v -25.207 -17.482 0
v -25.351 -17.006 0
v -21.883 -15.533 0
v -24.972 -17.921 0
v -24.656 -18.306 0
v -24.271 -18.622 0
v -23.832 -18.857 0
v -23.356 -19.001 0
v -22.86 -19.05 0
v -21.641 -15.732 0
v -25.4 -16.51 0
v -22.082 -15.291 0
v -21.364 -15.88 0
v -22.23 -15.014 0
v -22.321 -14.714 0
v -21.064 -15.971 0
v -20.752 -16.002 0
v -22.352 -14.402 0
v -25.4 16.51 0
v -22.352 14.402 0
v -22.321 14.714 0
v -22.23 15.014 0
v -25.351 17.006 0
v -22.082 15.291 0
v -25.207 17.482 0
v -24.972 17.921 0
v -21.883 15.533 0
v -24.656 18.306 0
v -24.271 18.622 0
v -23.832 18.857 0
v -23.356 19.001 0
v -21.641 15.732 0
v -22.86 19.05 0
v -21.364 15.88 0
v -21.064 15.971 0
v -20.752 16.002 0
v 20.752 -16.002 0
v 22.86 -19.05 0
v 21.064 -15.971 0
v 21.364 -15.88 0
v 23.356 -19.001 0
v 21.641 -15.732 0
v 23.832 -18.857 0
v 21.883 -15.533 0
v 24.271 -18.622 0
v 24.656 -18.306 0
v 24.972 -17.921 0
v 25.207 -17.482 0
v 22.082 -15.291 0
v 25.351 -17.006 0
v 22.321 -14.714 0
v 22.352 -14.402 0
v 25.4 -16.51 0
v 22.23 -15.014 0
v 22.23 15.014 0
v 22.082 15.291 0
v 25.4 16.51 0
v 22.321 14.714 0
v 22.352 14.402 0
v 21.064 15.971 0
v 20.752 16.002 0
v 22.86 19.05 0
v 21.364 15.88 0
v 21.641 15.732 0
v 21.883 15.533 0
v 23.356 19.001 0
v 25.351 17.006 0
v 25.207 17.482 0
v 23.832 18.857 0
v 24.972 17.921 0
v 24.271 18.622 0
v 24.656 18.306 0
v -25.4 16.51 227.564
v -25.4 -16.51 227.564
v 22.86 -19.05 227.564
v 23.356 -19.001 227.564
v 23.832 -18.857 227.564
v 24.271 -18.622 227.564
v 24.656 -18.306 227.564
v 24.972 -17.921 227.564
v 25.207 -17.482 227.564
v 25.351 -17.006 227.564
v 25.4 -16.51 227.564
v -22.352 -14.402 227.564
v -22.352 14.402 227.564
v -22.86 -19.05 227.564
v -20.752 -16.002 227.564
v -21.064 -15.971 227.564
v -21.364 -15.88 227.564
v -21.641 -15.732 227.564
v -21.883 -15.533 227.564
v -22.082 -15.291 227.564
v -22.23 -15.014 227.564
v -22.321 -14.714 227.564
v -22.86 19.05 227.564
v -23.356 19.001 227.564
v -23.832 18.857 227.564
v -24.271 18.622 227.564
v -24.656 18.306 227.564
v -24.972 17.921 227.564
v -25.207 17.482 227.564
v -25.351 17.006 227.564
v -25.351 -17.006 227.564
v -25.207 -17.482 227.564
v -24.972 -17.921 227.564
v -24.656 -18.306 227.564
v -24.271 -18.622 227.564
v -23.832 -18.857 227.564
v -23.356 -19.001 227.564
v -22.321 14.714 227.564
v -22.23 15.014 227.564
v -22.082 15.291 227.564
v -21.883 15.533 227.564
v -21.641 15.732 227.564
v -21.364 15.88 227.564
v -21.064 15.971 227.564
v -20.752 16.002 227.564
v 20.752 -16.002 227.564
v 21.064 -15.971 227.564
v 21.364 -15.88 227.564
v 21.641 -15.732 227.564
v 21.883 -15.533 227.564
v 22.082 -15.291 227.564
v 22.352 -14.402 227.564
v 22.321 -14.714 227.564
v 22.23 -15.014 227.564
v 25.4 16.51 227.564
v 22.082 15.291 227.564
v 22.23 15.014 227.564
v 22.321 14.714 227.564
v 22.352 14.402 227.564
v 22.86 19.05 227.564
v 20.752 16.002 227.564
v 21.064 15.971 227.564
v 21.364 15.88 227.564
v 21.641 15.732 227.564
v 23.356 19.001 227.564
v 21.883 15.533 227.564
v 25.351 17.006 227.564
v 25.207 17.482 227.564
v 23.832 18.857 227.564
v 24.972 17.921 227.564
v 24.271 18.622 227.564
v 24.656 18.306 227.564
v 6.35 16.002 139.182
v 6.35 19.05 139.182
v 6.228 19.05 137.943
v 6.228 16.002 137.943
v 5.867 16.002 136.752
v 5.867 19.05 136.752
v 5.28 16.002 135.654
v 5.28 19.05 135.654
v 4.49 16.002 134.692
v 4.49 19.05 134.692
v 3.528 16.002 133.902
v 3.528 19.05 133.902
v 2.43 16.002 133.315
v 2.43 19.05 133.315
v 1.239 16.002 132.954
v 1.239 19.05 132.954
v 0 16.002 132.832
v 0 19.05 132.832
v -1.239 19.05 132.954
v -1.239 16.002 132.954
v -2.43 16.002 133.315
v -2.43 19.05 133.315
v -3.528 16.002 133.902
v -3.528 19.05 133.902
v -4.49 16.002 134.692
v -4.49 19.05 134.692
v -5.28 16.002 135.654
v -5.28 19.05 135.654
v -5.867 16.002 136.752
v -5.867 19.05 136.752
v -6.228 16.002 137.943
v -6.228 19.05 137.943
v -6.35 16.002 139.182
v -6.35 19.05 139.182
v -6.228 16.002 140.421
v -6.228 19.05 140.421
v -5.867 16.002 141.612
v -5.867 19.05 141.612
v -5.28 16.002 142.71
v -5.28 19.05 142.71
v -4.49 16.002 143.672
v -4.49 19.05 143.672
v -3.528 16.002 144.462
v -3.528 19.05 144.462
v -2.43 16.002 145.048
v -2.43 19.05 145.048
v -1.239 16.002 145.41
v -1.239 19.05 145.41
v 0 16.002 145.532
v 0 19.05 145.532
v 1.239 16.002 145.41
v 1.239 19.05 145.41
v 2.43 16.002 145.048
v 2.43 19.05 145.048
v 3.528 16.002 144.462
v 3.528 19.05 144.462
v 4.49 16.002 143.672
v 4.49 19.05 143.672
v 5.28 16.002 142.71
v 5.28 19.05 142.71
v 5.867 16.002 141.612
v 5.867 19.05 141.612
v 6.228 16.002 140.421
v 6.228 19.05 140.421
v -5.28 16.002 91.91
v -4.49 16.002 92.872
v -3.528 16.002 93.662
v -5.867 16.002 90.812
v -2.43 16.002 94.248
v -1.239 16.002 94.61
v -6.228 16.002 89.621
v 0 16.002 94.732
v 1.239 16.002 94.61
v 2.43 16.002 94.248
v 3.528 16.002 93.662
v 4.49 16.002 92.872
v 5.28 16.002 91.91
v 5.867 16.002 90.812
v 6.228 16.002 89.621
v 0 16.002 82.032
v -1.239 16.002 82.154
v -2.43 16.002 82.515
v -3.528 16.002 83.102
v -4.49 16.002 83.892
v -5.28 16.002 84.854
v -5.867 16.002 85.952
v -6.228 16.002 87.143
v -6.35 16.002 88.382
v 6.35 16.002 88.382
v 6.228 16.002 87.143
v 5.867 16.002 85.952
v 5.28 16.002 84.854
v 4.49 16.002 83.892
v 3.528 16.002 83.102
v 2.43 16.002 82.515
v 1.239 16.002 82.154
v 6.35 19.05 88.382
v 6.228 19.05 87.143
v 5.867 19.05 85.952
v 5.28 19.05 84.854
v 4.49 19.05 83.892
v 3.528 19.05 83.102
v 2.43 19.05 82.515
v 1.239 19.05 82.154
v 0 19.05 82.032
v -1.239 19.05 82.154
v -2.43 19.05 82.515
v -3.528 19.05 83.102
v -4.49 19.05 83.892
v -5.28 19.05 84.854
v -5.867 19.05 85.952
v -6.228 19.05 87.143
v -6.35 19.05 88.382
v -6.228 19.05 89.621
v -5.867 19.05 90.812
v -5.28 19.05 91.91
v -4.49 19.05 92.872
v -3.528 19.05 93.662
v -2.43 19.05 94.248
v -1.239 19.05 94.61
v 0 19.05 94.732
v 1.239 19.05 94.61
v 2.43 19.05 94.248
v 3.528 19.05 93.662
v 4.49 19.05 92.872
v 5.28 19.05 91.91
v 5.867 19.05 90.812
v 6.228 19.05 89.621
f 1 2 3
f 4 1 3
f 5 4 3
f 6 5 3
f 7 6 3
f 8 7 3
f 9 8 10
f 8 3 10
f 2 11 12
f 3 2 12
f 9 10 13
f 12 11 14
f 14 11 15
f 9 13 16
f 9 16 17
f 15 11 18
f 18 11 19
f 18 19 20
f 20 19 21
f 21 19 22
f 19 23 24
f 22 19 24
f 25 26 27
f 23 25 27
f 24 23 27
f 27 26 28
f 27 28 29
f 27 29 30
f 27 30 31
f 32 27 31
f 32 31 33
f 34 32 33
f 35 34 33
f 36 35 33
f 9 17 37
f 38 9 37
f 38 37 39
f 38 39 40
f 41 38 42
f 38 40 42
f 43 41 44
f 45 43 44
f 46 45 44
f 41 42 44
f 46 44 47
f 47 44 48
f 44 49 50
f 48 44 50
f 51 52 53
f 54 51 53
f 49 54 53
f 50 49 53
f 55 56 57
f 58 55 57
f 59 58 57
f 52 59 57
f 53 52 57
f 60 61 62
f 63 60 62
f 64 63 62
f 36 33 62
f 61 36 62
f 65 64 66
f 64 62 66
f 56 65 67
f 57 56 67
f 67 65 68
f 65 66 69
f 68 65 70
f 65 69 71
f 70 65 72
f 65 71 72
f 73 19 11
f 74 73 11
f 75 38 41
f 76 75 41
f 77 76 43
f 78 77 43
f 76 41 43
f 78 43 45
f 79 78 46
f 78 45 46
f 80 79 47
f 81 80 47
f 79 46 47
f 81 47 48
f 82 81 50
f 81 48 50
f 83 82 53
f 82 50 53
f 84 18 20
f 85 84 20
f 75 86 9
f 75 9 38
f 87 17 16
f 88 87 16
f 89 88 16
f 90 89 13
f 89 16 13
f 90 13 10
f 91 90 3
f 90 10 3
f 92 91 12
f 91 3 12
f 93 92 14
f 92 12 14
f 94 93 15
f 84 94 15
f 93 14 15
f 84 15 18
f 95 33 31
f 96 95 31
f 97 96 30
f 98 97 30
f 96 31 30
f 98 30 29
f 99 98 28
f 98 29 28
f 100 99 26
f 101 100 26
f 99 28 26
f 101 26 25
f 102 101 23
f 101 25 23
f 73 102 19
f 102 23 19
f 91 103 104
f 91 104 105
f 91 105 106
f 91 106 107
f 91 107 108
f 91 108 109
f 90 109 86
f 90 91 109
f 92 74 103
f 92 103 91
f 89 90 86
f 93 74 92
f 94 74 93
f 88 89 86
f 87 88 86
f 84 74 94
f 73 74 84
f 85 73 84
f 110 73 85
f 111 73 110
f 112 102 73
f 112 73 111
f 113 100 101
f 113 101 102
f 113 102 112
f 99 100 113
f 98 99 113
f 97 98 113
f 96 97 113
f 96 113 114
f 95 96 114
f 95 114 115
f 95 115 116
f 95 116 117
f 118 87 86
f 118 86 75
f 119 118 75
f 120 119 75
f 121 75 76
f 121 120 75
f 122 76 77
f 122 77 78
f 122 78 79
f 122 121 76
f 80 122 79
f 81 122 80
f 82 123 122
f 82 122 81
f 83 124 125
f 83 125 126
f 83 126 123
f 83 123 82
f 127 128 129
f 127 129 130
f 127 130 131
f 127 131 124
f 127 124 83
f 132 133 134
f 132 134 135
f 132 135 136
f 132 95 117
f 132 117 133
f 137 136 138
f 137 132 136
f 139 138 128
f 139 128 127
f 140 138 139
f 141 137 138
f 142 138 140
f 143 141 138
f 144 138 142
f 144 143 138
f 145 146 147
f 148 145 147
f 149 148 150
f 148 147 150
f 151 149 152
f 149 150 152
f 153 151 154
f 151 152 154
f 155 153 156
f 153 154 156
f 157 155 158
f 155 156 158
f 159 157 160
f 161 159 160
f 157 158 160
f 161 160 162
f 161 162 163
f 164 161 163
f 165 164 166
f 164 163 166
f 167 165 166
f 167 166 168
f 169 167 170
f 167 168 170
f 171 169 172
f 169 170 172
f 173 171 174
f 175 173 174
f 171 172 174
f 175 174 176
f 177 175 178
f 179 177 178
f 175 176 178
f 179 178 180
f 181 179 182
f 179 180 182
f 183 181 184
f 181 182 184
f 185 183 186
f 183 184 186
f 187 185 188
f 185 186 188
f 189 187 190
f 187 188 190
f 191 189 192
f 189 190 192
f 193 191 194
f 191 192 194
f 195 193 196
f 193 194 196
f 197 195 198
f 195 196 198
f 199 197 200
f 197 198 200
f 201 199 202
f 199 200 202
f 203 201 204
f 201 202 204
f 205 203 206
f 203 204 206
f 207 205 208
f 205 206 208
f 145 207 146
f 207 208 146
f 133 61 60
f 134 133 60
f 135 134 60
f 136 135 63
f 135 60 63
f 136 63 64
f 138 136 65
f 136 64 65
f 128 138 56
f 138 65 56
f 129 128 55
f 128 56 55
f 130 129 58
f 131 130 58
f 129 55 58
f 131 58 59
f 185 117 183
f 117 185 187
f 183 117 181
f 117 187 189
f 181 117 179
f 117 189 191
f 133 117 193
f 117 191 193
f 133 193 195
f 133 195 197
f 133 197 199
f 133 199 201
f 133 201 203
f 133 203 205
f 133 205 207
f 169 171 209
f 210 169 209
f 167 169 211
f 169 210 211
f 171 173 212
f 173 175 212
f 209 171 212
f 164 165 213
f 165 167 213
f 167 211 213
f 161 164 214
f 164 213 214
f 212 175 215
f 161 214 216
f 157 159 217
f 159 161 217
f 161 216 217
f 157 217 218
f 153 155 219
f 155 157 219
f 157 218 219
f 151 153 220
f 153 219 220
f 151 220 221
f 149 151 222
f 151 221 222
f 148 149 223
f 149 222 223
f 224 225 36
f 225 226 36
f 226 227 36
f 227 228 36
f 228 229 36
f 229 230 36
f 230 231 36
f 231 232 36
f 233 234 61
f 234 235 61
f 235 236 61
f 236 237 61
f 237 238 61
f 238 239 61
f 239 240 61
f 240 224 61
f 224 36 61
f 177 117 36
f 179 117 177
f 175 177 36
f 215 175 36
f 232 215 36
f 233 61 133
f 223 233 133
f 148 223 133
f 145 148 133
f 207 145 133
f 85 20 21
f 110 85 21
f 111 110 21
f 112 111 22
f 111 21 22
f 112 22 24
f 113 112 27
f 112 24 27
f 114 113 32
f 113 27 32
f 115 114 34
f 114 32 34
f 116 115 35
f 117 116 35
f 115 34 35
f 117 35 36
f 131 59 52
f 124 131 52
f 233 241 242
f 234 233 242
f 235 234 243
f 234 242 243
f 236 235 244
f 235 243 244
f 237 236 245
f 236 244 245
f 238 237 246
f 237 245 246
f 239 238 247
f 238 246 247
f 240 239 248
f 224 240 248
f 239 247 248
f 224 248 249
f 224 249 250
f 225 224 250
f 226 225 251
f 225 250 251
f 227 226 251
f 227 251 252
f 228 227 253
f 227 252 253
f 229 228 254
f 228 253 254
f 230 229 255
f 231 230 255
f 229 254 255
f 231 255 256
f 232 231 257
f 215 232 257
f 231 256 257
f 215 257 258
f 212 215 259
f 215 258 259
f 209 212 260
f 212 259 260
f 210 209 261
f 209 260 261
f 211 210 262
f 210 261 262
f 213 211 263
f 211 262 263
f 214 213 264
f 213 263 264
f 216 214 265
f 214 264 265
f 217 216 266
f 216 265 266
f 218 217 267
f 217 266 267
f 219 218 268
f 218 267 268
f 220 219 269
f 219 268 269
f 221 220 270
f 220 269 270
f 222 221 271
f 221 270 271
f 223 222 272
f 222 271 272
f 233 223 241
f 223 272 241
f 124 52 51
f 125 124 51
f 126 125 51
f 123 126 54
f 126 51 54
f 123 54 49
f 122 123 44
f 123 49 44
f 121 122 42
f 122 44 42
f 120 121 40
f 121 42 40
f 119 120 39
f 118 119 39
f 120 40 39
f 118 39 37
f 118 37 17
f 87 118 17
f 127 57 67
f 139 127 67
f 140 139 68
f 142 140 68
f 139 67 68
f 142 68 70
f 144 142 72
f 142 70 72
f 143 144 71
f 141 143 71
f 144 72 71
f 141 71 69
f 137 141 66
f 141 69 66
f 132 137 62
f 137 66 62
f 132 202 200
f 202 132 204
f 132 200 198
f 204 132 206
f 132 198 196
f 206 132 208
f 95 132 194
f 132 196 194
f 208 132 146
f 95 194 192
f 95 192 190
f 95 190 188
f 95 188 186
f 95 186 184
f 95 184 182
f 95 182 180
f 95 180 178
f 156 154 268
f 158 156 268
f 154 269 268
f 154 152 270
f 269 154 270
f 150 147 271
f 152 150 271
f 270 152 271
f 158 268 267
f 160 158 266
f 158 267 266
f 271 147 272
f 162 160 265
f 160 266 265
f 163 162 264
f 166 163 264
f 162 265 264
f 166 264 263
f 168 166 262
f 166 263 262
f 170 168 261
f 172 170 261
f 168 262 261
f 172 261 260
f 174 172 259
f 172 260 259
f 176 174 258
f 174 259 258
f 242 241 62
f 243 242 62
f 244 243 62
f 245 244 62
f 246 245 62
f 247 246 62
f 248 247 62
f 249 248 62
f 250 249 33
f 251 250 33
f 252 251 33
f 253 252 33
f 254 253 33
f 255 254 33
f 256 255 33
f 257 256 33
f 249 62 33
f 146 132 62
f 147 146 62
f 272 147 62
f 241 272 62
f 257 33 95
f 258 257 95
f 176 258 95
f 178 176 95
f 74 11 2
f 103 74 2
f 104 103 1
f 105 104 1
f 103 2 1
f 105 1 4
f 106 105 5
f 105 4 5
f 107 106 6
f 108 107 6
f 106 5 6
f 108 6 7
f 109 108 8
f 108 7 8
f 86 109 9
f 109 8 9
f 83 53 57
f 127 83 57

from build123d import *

# Parameters (mm, degrees)
BOSS_EXTRUDE1_DEPTH = 227.56368
SKETCH9_R           = 6.35
CUT_EXTRUDE2_DEPTH  = 3.048


with BuildPart() as part:
    # Sketch4 → Boss-Extrude1 (new body)
    with BuildSketch(Plane.XY):
        with BuildLine():
            Line((25.4, -16.51), (25.4, 16.51))
            ThreePointArc((25.4, 16.51), (24.656051224, 18.306051224), (22.86, 19.05))
            Line((22.86, 19.05), (-22.86, 19.05))
            ThreePointArc((-22.86, 19.05), (-24.656051224, 18.306051224), (-25.4, 16.51))
            Line((-25.4, 16.51), (-25.4, -16.51))
            ThreePointArc((-25.4, -16.51), (-24.656051224, -18.306051224), (-22.86, -19.05))
            Line((-22.86, -19.05), (22.86, -19.05))
            ThreePointArc((22.86, -19.05), (24.656051224, -18.306051224), (25.4, -16.51))
        make_face()
        with BuildLine():
            Line((22.352, 14.4018), (22.352, -14.4018))
            ThreePointArc((22.352, -14.4018), (21.883312271, -15.533312271), (20.7518, -16.002))
            Line((20.7518, -16.002), (-20.7518, -16.002))
            ThreePointArc((-20.7518, -16.002), (-21.883312271, -15.533312271), (-22.352, -14.4018))
            Line((-22.352, -14.4018), (-22.352, 14.4018))
            ThreePointArc((-22.352, 14.4018), (-21.883312271, 15.533312271), (-20.7518, 16.002))
            Line((-20.7518, 16.002), (20.7518, 16.002))
            ThreePointArc((20.7518, 16.002), (21.883312271, 15.533312271), (22.352, 14.4018))
        make_face(mode=Mode.SUBTRACT)
    extrude(amount=BOSS_EXTRUDE1_DEPTH)

    # Sketch9 → Cut-Extrude2 (cut)
    with BuildSketch(Plane(origin=(0, 19.05, 0), x_dir=(1, 0, 0), z_dir=(0, 1, 0))):
        with Locations((0, -139.18184)):
            Circle(SKETCH9_R)
        with Locations((0, -88.38184)):
            Circle(SKETCH9_R)
    extrude(amount=-CUT_EXTRUDE2_DEPTH, mode=Mode.SUBTRACT)


solid = part.part
